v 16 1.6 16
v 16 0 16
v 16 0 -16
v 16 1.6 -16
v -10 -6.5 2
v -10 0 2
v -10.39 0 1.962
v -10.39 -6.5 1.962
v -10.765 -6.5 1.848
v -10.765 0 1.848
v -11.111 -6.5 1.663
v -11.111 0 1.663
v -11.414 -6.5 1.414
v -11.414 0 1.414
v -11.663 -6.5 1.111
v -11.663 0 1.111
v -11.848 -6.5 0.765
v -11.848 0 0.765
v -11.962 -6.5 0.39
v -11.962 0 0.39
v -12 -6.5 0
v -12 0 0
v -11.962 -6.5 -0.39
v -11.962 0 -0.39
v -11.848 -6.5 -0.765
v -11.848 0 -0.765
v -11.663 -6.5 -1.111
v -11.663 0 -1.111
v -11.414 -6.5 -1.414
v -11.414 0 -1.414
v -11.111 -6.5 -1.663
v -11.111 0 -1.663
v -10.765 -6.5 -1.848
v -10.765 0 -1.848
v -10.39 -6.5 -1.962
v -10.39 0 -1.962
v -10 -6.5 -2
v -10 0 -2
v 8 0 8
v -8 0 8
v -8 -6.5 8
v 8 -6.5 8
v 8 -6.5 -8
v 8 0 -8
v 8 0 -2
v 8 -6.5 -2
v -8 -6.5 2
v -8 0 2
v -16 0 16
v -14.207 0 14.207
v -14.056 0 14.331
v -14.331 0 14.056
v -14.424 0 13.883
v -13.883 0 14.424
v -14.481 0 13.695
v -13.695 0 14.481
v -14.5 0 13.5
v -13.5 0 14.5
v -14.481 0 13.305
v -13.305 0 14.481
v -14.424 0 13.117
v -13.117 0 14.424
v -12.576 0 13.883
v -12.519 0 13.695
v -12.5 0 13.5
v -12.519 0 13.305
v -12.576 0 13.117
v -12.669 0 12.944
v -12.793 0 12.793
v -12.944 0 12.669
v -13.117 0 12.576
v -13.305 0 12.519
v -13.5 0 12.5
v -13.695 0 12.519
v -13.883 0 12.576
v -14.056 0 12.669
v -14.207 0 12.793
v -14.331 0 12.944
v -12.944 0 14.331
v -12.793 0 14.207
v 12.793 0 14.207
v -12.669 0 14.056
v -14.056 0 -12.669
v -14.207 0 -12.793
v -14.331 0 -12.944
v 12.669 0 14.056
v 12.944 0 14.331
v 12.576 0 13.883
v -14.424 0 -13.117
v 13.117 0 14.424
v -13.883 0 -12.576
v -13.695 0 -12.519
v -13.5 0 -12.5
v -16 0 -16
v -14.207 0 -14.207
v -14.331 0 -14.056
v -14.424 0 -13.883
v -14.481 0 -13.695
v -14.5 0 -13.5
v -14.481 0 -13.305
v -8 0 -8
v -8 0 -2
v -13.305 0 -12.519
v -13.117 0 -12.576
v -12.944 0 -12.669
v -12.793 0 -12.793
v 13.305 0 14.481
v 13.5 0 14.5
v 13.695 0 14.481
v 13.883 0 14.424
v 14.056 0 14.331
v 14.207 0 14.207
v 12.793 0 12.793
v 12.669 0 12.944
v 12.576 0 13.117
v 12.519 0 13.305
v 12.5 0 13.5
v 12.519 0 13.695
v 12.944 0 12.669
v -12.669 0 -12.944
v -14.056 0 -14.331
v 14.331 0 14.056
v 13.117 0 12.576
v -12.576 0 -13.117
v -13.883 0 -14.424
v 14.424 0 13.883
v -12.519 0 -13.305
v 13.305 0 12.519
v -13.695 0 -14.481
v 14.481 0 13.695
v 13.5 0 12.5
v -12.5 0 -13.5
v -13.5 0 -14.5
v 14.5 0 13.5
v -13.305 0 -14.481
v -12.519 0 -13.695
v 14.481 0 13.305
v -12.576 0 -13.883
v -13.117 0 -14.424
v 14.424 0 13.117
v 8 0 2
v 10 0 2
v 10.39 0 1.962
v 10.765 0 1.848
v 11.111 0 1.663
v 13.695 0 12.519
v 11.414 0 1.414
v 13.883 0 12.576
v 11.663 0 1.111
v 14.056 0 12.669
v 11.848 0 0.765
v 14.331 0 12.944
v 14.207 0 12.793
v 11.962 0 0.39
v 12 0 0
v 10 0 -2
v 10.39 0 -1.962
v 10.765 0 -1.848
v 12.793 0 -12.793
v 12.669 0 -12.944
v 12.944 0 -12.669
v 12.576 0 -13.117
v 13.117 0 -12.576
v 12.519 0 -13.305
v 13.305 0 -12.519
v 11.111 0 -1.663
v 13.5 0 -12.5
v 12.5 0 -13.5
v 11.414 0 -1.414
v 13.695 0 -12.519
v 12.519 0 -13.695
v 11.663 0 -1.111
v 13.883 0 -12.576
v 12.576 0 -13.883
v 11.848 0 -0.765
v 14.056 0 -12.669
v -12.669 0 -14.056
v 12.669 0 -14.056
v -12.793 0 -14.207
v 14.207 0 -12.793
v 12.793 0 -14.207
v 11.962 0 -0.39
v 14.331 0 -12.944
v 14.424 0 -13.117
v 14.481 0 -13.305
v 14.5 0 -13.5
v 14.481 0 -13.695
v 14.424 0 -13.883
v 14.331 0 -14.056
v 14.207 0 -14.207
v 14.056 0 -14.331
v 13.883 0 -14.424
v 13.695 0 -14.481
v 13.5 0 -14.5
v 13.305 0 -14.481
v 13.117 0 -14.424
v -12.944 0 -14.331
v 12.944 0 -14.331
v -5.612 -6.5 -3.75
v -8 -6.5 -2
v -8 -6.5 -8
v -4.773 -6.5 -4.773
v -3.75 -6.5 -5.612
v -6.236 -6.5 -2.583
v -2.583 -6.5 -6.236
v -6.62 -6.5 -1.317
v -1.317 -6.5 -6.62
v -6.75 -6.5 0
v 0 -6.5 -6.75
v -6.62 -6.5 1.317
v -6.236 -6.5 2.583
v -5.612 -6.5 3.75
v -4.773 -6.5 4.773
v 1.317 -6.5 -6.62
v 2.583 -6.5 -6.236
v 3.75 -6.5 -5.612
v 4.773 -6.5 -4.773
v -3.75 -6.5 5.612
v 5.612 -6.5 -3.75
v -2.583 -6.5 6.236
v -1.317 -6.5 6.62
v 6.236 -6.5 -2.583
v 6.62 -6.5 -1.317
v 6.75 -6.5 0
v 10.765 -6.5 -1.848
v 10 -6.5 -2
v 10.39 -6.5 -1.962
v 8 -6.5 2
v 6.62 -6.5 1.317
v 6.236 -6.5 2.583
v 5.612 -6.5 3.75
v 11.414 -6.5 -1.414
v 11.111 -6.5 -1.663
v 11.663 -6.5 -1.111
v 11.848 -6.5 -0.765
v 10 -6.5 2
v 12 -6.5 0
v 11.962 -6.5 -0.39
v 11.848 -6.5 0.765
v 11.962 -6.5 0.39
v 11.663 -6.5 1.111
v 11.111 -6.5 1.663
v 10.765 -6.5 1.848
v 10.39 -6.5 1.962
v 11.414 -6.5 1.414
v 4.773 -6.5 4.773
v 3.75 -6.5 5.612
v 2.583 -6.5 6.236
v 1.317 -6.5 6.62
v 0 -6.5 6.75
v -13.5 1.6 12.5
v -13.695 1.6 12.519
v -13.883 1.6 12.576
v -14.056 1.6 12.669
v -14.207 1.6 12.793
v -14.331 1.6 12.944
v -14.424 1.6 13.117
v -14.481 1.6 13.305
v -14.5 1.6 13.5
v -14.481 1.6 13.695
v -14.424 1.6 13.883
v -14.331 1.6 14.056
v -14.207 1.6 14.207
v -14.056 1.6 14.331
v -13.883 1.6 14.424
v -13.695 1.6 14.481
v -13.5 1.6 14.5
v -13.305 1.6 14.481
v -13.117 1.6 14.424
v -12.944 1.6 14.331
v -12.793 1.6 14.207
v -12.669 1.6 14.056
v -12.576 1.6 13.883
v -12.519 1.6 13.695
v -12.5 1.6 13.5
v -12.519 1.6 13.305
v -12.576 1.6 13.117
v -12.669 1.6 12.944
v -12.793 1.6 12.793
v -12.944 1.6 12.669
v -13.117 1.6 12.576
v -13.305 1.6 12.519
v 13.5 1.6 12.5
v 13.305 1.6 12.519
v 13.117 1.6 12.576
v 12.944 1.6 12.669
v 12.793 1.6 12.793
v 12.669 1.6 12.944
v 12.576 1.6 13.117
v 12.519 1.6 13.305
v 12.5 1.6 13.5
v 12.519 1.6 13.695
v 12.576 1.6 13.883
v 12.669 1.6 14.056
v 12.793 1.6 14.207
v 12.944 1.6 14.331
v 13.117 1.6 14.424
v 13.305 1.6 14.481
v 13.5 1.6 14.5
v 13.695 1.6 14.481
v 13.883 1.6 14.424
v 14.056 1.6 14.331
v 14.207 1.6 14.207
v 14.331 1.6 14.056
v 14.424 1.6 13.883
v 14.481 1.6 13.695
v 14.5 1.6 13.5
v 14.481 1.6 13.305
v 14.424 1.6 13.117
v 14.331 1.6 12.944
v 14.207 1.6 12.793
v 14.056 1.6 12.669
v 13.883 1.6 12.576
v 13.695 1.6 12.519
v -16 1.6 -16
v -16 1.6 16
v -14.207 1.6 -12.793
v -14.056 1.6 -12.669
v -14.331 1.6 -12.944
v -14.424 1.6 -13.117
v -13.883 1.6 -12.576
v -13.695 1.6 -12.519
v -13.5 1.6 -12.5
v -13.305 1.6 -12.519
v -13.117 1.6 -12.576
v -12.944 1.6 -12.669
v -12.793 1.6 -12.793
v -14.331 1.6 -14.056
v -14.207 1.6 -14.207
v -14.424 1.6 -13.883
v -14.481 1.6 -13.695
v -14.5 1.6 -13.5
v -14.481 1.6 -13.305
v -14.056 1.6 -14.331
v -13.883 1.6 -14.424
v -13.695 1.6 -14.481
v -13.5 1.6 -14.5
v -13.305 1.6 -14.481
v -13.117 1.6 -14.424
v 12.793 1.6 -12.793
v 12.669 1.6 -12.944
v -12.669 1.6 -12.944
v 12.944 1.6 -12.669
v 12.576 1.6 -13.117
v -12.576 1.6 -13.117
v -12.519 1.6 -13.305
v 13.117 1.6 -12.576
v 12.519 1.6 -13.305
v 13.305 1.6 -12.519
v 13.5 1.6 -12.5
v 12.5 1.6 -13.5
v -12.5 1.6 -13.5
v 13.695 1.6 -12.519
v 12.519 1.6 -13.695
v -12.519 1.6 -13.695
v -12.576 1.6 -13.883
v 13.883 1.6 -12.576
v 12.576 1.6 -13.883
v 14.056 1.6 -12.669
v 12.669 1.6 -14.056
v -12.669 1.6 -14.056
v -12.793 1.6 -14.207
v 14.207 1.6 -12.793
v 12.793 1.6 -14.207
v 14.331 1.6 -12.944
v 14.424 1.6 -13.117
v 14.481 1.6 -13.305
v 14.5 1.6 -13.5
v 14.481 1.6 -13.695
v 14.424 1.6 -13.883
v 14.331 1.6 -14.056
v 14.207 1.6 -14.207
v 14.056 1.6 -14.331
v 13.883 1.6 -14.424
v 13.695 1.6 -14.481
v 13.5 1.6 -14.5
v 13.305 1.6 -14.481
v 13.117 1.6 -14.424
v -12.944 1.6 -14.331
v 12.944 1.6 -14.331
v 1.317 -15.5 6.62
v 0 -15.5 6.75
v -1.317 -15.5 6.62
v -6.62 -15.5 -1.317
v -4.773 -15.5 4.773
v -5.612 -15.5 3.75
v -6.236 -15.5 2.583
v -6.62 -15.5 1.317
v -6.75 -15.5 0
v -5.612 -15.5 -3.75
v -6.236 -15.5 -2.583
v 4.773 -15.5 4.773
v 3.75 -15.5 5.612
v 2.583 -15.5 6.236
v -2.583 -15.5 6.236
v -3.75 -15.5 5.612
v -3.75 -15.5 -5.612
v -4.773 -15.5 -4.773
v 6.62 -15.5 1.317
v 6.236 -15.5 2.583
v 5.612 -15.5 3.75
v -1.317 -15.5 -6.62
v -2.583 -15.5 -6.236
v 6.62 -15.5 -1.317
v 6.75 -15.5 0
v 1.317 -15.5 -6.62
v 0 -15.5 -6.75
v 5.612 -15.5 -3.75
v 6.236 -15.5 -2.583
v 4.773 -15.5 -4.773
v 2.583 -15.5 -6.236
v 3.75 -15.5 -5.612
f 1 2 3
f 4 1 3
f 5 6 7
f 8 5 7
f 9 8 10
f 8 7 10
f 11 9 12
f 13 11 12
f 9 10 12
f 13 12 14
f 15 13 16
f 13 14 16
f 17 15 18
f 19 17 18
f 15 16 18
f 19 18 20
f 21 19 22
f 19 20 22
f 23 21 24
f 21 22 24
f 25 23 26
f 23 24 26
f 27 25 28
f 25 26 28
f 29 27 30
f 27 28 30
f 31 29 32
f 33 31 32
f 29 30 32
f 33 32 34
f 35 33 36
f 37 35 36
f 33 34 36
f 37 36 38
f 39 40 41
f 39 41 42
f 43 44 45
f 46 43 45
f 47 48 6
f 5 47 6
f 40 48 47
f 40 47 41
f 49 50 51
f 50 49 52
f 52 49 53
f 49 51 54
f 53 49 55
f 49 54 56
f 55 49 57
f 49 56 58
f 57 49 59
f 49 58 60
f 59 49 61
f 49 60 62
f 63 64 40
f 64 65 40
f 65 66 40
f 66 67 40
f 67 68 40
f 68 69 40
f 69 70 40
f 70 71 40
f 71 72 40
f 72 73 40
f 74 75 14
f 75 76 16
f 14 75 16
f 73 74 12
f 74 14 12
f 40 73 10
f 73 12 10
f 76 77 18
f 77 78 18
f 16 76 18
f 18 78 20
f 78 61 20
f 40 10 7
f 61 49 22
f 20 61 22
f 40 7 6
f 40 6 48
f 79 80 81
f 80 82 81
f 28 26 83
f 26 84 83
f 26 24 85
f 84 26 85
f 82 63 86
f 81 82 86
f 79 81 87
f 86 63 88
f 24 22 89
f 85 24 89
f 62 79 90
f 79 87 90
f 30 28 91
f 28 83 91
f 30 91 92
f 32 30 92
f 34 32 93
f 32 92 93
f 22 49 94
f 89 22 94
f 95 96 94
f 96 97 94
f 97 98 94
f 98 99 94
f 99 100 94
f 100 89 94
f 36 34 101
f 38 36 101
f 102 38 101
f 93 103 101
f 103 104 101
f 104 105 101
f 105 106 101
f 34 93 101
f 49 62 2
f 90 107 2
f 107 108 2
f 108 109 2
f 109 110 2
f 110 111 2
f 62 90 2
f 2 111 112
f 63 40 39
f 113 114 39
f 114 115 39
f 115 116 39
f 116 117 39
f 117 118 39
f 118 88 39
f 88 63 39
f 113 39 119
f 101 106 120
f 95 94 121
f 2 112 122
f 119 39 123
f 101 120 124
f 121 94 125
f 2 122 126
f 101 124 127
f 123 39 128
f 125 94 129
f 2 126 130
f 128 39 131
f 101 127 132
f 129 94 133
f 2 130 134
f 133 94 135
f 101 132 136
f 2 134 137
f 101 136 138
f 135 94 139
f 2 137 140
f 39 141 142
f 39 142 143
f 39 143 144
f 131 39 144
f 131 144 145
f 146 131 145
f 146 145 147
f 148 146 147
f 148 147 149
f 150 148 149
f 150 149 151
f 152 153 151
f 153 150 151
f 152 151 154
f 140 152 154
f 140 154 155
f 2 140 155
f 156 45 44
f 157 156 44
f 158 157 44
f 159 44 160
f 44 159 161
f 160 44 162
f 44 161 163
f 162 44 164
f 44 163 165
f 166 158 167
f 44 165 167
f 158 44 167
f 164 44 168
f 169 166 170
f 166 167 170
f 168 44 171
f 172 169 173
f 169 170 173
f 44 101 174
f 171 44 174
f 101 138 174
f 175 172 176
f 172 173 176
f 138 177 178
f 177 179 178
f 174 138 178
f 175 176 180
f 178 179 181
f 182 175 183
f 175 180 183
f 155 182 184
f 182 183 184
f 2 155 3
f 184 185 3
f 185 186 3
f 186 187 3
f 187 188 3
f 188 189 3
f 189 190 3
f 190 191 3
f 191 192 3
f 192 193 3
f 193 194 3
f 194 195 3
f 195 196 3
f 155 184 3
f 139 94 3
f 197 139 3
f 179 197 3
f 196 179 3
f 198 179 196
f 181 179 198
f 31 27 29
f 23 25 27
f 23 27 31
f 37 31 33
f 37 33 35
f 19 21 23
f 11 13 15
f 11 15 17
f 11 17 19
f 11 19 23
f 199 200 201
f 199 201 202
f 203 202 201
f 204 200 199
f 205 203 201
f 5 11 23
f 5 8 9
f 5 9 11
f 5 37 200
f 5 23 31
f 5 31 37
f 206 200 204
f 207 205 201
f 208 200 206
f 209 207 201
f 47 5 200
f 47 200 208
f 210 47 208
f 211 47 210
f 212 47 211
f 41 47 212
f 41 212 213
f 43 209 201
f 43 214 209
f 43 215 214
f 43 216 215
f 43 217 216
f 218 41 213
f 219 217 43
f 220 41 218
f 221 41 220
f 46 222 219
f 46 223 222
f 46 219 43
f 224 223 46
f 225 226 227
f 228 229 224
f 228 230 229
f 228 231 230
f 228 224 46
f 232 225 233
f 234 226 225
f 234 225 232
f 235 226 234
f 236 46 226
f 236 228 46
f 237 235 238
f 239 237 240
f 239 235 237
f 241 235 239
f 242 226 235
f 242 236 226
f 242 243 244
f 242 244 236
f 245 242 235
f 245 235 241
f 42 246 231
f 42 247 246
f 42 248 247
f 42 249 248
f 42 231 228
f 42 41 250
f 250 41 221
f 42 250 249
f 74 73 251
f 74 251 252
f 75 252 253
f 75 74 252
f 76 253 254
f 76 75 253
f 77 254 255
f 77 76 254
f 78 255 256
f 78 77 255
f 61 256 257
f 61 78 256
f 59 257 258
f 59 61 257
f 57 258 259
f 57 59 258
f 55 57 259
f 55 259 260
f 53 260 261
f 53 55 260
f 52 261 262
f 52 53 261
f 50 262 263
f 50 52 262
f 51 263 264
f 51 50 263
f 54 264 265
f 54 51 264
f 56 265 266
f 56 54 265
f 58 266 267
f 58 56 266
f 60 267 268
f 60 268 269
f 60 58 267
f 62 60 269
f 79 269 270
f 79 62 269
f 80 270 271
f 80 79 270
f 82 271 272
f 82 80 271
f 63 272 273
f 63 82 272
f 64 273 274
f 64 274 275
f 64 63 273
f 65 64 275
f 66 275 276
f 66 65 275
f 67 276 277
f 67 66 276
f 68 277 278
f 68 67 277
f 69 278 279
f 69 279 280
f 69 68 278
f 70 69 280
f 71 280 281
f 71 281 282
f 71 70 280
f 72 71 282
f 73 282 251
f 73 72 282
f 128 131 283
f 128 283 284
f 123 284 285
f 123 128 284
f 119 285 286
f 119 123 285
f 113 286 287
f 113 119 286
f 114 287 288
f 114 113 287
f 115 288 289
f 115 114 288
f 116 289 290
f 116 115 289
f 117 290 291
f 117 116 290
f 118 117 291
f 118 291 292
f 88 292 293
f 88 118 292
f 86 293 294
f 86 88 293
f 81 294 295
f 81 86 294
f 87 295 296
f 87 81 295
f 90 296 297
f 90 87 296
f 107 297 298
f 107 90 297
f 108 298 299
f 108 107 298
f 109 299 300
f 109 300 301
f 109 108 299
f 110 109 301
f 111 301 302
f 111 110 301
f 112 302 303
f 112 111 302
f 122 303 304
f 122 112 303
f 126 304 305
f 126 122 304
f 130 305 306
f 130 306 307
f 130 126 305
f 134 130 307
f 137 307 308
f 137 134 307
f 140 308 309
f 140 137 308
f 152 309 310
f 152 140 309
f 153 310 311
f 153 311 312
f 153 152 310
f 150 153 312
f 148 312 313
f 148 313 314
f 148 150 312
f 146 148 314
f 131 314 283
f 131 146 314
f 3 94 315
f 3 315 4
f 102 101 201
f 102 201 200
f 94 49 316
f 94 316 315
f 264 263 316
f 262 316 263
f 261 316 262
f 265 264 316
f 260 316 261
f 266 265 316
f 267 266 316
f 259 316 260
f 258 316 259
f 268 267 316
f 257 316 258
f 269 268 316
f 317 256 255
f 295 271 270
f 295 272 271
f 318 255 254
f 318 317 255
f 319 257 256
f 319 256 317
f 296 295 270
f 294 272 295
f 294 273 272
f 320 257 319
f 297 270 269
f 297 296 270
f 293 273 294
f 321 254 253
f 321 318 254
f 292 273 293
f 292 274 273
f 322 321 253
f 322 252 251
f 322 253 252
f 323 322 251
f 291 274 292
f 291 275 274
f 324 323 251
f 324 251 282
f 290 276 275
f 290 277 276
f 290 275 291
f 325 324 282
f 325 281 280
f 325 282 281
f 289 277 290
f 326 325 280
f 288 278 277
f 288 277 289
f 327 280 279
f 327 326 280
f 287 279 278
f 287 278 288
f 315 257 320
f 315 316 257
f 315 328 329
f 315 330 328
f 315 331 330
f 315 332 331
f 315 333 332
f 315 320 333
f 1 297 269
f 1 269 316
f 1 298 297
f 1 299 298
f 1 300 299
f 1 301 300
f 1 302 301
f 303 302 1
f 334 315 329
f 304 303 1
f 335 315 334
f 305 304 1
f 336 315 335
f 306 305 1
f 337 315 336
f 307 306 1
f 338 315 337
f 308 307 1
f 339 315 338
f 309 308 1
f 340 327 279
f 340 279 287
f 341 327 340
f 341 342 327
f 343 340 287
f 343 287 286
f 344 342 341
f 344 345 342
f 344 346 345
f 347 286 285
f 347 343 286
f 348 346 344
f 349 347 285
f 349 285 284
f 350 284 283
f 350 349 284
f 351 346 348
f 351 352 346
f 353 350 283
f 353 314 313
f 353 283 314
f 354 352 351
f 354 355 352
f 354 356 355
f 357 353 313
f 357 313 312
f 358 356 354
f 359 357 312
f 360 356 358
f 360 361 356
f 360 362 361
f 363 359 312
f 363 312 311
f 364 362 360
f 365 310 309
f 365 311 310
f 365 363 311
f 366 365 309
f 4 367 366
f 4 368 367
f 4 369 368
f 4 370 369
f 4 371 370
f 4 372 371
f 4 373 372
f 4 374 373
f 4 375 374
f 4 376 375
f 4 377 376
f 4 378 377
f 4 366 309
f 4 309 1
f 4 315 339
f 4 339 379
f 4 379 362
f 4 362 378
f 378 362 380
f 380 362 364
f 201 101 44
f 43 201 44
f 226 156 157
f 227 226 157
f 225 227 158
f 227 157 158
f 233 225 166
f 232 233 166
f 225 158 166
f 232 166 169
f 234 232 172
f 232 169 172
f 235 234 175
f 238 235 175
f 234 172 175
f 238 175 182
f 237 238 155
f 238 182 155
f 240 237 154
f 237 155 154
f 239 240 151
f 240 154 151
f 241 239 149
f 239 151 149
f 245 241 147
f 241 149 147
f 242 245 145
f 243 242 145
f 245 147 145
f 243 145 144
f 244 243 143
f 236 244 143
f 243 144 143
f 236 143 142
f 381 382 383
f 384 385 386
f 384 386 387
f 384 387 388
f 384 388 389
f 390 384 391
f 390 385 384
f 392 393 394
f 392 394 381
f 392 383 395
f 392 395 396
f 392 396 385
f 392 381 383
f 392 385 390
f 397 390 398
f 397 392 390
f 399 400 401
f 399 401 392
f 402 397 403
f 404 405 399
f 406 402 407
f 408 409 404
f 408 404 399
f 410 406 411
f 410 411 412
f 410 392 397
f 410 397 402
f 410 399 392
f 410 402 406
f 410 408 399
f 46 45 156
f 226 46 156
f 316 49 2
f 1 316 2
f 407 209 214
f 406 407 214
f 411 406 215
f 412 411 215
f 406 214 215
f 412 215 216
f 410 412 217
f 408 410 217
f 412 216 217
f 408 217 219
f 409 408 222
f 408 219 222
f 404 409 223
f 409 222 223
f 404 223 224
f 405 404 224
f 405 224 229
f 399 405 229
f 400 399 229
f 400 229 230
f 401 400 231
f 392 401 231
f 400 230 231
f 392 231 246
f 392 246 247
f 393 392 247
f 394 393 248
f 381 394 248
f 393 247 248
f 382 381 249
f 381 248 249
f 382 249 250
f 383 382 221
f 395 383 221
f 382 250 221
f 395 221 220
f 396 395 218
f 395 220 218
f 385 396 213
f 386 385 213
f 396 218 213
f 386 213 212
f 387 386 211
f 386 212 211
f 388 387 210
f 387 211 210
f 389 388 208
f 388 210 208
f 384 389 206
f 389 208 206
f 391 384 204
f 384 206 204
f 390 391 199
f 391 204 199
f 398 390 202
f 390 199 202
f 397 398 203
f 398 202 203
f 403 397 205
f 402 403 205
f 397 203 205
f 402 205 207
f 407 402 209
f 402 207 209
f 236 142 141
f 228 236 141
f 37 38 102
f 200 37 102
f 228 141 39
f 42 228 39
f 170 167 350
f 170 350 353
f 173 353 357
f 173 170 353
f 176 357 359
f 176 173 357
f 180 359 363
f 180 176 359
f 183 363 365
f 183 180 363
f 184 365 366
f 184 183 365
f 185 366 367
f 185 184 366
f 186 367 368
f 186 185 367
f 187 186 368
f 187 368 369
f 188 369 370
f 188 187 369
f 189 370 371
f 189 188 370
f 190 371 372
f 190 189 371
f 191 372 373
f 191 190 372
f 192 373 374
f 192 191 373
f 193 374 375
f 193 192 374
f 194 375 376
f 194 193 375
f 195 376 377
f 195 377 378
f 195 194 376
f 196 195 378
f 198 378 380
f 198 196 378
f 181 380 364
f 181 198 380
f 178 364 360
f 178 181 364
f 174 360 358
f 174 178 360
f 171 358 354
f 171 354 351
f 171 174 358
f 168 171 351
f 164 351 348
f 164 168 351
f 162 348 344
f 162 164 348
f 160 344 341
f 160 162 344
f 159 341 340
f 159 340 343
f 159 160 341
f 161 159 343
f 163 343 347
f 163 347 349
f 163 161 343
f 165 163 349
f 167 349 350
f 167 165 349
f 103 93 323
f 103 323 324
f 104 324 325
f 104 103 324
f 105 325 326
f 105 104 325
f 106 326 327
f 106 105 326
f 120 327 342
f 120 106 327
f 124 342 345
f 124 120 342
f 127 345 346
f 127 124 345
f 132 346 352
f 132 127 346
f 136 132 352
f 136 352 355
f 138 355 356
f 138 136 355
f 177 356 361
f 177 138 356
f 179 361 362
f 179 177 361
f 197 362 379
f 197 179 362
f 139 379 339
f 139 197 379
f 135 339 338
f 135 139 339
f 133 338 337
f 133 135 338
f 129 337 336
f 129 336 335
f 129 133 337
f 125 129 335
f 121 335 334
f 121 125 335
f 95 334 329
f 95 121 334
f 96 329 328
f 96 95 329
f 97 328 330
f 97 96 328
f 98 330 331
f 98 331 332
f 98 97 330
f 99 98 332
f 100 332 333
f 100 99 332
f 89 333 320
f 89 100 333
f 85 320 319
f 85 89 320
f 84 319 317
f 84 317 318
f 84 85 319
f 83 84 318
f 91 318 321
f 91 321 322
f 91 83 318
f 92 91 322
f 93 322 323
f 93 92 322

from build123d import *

# Parameters (mm, degrees)
SKETCH_1_W      = 32
SKETCH_1_H      = 32
SKETCH_1_R      = 1
EXTRUDE_1_DEPTH = 1.6
SKETCH_2_W      = 16
SKETCH_2_H      = 16
EXTRUDE_2_DEPTH = 6.5
SKETCH_3_R      = 6.75
EXTRUDE_3_DEPTH = 9


with BuildPart() as part:
    # 草图1 → 凸台-拉伸1 (new body)
    with BuildSketch(Plane(origin=(0, 0, 0), x_dir=(1, 0, 0), z_dir=(0, 1, 0))):
        Rectangle(SKETCH_1_W, SKETCH_1_H)
        with Locations(Location((13.5, 13.5, 0), (0, 0, 270))):
            Circle(SKETCH_1_R, mode=Mode.SUBTRACT)
        with Locations(Location((-13.5, -13.5, 0), (0, 0, 90))):
            Circle(SKETCH_1_R, mode=Mode.SUBTRACT)
        with Locations(Location((-13.5, 13.5, 0), (0, 0, 270))):
            Circle(SKETCH_1_R, mode=Mode.SUBTRACT)
        with Locations(Location((13.5, -13.5, 0), (0, 0, 90))):
            Circle(SKETCH_1_R, mode=Mode.SUBTRACT)
    extrude(amount=EXTRUDE_1_DEPTH)

    # 草图2 → 凸台-拉伸2 (add)
    with BuildSketch(Plane.XZ):
        Rectangle(SKETCH_2_W, SKETCH_2_H)
        with BuildLine():
            Line((-10, -2), (-8, -2))
            Line((-8, -2), (-8, 2))
            Line((-8, 2), (-10, 2))
            ThreePointArc((-10, 2), (-12, 0), (-10, -2))
        make_face()
        with BuildLine():
            Line((8, 2), (8, -2))
            Line((8, -2), (10, -2))
            ThreePointArc((10, -2), (12, 0), (10, 2))
            Line((10, 2), (8, 2))
        make_face()
    extrude(amount=EXTRUDE_2_DEPTH)

    # 草图3 → 凸台-拉伸3 (add)
    with BuildSketch(Plane.XZ.offset(6.5)):
        with Locations(Location((0, 0, 0), (0, 0, 270))):
            Circle(SKETCH_3_R)
    extrude(amount=EXTRUDE_3_DEPTH)


solid = part.part
